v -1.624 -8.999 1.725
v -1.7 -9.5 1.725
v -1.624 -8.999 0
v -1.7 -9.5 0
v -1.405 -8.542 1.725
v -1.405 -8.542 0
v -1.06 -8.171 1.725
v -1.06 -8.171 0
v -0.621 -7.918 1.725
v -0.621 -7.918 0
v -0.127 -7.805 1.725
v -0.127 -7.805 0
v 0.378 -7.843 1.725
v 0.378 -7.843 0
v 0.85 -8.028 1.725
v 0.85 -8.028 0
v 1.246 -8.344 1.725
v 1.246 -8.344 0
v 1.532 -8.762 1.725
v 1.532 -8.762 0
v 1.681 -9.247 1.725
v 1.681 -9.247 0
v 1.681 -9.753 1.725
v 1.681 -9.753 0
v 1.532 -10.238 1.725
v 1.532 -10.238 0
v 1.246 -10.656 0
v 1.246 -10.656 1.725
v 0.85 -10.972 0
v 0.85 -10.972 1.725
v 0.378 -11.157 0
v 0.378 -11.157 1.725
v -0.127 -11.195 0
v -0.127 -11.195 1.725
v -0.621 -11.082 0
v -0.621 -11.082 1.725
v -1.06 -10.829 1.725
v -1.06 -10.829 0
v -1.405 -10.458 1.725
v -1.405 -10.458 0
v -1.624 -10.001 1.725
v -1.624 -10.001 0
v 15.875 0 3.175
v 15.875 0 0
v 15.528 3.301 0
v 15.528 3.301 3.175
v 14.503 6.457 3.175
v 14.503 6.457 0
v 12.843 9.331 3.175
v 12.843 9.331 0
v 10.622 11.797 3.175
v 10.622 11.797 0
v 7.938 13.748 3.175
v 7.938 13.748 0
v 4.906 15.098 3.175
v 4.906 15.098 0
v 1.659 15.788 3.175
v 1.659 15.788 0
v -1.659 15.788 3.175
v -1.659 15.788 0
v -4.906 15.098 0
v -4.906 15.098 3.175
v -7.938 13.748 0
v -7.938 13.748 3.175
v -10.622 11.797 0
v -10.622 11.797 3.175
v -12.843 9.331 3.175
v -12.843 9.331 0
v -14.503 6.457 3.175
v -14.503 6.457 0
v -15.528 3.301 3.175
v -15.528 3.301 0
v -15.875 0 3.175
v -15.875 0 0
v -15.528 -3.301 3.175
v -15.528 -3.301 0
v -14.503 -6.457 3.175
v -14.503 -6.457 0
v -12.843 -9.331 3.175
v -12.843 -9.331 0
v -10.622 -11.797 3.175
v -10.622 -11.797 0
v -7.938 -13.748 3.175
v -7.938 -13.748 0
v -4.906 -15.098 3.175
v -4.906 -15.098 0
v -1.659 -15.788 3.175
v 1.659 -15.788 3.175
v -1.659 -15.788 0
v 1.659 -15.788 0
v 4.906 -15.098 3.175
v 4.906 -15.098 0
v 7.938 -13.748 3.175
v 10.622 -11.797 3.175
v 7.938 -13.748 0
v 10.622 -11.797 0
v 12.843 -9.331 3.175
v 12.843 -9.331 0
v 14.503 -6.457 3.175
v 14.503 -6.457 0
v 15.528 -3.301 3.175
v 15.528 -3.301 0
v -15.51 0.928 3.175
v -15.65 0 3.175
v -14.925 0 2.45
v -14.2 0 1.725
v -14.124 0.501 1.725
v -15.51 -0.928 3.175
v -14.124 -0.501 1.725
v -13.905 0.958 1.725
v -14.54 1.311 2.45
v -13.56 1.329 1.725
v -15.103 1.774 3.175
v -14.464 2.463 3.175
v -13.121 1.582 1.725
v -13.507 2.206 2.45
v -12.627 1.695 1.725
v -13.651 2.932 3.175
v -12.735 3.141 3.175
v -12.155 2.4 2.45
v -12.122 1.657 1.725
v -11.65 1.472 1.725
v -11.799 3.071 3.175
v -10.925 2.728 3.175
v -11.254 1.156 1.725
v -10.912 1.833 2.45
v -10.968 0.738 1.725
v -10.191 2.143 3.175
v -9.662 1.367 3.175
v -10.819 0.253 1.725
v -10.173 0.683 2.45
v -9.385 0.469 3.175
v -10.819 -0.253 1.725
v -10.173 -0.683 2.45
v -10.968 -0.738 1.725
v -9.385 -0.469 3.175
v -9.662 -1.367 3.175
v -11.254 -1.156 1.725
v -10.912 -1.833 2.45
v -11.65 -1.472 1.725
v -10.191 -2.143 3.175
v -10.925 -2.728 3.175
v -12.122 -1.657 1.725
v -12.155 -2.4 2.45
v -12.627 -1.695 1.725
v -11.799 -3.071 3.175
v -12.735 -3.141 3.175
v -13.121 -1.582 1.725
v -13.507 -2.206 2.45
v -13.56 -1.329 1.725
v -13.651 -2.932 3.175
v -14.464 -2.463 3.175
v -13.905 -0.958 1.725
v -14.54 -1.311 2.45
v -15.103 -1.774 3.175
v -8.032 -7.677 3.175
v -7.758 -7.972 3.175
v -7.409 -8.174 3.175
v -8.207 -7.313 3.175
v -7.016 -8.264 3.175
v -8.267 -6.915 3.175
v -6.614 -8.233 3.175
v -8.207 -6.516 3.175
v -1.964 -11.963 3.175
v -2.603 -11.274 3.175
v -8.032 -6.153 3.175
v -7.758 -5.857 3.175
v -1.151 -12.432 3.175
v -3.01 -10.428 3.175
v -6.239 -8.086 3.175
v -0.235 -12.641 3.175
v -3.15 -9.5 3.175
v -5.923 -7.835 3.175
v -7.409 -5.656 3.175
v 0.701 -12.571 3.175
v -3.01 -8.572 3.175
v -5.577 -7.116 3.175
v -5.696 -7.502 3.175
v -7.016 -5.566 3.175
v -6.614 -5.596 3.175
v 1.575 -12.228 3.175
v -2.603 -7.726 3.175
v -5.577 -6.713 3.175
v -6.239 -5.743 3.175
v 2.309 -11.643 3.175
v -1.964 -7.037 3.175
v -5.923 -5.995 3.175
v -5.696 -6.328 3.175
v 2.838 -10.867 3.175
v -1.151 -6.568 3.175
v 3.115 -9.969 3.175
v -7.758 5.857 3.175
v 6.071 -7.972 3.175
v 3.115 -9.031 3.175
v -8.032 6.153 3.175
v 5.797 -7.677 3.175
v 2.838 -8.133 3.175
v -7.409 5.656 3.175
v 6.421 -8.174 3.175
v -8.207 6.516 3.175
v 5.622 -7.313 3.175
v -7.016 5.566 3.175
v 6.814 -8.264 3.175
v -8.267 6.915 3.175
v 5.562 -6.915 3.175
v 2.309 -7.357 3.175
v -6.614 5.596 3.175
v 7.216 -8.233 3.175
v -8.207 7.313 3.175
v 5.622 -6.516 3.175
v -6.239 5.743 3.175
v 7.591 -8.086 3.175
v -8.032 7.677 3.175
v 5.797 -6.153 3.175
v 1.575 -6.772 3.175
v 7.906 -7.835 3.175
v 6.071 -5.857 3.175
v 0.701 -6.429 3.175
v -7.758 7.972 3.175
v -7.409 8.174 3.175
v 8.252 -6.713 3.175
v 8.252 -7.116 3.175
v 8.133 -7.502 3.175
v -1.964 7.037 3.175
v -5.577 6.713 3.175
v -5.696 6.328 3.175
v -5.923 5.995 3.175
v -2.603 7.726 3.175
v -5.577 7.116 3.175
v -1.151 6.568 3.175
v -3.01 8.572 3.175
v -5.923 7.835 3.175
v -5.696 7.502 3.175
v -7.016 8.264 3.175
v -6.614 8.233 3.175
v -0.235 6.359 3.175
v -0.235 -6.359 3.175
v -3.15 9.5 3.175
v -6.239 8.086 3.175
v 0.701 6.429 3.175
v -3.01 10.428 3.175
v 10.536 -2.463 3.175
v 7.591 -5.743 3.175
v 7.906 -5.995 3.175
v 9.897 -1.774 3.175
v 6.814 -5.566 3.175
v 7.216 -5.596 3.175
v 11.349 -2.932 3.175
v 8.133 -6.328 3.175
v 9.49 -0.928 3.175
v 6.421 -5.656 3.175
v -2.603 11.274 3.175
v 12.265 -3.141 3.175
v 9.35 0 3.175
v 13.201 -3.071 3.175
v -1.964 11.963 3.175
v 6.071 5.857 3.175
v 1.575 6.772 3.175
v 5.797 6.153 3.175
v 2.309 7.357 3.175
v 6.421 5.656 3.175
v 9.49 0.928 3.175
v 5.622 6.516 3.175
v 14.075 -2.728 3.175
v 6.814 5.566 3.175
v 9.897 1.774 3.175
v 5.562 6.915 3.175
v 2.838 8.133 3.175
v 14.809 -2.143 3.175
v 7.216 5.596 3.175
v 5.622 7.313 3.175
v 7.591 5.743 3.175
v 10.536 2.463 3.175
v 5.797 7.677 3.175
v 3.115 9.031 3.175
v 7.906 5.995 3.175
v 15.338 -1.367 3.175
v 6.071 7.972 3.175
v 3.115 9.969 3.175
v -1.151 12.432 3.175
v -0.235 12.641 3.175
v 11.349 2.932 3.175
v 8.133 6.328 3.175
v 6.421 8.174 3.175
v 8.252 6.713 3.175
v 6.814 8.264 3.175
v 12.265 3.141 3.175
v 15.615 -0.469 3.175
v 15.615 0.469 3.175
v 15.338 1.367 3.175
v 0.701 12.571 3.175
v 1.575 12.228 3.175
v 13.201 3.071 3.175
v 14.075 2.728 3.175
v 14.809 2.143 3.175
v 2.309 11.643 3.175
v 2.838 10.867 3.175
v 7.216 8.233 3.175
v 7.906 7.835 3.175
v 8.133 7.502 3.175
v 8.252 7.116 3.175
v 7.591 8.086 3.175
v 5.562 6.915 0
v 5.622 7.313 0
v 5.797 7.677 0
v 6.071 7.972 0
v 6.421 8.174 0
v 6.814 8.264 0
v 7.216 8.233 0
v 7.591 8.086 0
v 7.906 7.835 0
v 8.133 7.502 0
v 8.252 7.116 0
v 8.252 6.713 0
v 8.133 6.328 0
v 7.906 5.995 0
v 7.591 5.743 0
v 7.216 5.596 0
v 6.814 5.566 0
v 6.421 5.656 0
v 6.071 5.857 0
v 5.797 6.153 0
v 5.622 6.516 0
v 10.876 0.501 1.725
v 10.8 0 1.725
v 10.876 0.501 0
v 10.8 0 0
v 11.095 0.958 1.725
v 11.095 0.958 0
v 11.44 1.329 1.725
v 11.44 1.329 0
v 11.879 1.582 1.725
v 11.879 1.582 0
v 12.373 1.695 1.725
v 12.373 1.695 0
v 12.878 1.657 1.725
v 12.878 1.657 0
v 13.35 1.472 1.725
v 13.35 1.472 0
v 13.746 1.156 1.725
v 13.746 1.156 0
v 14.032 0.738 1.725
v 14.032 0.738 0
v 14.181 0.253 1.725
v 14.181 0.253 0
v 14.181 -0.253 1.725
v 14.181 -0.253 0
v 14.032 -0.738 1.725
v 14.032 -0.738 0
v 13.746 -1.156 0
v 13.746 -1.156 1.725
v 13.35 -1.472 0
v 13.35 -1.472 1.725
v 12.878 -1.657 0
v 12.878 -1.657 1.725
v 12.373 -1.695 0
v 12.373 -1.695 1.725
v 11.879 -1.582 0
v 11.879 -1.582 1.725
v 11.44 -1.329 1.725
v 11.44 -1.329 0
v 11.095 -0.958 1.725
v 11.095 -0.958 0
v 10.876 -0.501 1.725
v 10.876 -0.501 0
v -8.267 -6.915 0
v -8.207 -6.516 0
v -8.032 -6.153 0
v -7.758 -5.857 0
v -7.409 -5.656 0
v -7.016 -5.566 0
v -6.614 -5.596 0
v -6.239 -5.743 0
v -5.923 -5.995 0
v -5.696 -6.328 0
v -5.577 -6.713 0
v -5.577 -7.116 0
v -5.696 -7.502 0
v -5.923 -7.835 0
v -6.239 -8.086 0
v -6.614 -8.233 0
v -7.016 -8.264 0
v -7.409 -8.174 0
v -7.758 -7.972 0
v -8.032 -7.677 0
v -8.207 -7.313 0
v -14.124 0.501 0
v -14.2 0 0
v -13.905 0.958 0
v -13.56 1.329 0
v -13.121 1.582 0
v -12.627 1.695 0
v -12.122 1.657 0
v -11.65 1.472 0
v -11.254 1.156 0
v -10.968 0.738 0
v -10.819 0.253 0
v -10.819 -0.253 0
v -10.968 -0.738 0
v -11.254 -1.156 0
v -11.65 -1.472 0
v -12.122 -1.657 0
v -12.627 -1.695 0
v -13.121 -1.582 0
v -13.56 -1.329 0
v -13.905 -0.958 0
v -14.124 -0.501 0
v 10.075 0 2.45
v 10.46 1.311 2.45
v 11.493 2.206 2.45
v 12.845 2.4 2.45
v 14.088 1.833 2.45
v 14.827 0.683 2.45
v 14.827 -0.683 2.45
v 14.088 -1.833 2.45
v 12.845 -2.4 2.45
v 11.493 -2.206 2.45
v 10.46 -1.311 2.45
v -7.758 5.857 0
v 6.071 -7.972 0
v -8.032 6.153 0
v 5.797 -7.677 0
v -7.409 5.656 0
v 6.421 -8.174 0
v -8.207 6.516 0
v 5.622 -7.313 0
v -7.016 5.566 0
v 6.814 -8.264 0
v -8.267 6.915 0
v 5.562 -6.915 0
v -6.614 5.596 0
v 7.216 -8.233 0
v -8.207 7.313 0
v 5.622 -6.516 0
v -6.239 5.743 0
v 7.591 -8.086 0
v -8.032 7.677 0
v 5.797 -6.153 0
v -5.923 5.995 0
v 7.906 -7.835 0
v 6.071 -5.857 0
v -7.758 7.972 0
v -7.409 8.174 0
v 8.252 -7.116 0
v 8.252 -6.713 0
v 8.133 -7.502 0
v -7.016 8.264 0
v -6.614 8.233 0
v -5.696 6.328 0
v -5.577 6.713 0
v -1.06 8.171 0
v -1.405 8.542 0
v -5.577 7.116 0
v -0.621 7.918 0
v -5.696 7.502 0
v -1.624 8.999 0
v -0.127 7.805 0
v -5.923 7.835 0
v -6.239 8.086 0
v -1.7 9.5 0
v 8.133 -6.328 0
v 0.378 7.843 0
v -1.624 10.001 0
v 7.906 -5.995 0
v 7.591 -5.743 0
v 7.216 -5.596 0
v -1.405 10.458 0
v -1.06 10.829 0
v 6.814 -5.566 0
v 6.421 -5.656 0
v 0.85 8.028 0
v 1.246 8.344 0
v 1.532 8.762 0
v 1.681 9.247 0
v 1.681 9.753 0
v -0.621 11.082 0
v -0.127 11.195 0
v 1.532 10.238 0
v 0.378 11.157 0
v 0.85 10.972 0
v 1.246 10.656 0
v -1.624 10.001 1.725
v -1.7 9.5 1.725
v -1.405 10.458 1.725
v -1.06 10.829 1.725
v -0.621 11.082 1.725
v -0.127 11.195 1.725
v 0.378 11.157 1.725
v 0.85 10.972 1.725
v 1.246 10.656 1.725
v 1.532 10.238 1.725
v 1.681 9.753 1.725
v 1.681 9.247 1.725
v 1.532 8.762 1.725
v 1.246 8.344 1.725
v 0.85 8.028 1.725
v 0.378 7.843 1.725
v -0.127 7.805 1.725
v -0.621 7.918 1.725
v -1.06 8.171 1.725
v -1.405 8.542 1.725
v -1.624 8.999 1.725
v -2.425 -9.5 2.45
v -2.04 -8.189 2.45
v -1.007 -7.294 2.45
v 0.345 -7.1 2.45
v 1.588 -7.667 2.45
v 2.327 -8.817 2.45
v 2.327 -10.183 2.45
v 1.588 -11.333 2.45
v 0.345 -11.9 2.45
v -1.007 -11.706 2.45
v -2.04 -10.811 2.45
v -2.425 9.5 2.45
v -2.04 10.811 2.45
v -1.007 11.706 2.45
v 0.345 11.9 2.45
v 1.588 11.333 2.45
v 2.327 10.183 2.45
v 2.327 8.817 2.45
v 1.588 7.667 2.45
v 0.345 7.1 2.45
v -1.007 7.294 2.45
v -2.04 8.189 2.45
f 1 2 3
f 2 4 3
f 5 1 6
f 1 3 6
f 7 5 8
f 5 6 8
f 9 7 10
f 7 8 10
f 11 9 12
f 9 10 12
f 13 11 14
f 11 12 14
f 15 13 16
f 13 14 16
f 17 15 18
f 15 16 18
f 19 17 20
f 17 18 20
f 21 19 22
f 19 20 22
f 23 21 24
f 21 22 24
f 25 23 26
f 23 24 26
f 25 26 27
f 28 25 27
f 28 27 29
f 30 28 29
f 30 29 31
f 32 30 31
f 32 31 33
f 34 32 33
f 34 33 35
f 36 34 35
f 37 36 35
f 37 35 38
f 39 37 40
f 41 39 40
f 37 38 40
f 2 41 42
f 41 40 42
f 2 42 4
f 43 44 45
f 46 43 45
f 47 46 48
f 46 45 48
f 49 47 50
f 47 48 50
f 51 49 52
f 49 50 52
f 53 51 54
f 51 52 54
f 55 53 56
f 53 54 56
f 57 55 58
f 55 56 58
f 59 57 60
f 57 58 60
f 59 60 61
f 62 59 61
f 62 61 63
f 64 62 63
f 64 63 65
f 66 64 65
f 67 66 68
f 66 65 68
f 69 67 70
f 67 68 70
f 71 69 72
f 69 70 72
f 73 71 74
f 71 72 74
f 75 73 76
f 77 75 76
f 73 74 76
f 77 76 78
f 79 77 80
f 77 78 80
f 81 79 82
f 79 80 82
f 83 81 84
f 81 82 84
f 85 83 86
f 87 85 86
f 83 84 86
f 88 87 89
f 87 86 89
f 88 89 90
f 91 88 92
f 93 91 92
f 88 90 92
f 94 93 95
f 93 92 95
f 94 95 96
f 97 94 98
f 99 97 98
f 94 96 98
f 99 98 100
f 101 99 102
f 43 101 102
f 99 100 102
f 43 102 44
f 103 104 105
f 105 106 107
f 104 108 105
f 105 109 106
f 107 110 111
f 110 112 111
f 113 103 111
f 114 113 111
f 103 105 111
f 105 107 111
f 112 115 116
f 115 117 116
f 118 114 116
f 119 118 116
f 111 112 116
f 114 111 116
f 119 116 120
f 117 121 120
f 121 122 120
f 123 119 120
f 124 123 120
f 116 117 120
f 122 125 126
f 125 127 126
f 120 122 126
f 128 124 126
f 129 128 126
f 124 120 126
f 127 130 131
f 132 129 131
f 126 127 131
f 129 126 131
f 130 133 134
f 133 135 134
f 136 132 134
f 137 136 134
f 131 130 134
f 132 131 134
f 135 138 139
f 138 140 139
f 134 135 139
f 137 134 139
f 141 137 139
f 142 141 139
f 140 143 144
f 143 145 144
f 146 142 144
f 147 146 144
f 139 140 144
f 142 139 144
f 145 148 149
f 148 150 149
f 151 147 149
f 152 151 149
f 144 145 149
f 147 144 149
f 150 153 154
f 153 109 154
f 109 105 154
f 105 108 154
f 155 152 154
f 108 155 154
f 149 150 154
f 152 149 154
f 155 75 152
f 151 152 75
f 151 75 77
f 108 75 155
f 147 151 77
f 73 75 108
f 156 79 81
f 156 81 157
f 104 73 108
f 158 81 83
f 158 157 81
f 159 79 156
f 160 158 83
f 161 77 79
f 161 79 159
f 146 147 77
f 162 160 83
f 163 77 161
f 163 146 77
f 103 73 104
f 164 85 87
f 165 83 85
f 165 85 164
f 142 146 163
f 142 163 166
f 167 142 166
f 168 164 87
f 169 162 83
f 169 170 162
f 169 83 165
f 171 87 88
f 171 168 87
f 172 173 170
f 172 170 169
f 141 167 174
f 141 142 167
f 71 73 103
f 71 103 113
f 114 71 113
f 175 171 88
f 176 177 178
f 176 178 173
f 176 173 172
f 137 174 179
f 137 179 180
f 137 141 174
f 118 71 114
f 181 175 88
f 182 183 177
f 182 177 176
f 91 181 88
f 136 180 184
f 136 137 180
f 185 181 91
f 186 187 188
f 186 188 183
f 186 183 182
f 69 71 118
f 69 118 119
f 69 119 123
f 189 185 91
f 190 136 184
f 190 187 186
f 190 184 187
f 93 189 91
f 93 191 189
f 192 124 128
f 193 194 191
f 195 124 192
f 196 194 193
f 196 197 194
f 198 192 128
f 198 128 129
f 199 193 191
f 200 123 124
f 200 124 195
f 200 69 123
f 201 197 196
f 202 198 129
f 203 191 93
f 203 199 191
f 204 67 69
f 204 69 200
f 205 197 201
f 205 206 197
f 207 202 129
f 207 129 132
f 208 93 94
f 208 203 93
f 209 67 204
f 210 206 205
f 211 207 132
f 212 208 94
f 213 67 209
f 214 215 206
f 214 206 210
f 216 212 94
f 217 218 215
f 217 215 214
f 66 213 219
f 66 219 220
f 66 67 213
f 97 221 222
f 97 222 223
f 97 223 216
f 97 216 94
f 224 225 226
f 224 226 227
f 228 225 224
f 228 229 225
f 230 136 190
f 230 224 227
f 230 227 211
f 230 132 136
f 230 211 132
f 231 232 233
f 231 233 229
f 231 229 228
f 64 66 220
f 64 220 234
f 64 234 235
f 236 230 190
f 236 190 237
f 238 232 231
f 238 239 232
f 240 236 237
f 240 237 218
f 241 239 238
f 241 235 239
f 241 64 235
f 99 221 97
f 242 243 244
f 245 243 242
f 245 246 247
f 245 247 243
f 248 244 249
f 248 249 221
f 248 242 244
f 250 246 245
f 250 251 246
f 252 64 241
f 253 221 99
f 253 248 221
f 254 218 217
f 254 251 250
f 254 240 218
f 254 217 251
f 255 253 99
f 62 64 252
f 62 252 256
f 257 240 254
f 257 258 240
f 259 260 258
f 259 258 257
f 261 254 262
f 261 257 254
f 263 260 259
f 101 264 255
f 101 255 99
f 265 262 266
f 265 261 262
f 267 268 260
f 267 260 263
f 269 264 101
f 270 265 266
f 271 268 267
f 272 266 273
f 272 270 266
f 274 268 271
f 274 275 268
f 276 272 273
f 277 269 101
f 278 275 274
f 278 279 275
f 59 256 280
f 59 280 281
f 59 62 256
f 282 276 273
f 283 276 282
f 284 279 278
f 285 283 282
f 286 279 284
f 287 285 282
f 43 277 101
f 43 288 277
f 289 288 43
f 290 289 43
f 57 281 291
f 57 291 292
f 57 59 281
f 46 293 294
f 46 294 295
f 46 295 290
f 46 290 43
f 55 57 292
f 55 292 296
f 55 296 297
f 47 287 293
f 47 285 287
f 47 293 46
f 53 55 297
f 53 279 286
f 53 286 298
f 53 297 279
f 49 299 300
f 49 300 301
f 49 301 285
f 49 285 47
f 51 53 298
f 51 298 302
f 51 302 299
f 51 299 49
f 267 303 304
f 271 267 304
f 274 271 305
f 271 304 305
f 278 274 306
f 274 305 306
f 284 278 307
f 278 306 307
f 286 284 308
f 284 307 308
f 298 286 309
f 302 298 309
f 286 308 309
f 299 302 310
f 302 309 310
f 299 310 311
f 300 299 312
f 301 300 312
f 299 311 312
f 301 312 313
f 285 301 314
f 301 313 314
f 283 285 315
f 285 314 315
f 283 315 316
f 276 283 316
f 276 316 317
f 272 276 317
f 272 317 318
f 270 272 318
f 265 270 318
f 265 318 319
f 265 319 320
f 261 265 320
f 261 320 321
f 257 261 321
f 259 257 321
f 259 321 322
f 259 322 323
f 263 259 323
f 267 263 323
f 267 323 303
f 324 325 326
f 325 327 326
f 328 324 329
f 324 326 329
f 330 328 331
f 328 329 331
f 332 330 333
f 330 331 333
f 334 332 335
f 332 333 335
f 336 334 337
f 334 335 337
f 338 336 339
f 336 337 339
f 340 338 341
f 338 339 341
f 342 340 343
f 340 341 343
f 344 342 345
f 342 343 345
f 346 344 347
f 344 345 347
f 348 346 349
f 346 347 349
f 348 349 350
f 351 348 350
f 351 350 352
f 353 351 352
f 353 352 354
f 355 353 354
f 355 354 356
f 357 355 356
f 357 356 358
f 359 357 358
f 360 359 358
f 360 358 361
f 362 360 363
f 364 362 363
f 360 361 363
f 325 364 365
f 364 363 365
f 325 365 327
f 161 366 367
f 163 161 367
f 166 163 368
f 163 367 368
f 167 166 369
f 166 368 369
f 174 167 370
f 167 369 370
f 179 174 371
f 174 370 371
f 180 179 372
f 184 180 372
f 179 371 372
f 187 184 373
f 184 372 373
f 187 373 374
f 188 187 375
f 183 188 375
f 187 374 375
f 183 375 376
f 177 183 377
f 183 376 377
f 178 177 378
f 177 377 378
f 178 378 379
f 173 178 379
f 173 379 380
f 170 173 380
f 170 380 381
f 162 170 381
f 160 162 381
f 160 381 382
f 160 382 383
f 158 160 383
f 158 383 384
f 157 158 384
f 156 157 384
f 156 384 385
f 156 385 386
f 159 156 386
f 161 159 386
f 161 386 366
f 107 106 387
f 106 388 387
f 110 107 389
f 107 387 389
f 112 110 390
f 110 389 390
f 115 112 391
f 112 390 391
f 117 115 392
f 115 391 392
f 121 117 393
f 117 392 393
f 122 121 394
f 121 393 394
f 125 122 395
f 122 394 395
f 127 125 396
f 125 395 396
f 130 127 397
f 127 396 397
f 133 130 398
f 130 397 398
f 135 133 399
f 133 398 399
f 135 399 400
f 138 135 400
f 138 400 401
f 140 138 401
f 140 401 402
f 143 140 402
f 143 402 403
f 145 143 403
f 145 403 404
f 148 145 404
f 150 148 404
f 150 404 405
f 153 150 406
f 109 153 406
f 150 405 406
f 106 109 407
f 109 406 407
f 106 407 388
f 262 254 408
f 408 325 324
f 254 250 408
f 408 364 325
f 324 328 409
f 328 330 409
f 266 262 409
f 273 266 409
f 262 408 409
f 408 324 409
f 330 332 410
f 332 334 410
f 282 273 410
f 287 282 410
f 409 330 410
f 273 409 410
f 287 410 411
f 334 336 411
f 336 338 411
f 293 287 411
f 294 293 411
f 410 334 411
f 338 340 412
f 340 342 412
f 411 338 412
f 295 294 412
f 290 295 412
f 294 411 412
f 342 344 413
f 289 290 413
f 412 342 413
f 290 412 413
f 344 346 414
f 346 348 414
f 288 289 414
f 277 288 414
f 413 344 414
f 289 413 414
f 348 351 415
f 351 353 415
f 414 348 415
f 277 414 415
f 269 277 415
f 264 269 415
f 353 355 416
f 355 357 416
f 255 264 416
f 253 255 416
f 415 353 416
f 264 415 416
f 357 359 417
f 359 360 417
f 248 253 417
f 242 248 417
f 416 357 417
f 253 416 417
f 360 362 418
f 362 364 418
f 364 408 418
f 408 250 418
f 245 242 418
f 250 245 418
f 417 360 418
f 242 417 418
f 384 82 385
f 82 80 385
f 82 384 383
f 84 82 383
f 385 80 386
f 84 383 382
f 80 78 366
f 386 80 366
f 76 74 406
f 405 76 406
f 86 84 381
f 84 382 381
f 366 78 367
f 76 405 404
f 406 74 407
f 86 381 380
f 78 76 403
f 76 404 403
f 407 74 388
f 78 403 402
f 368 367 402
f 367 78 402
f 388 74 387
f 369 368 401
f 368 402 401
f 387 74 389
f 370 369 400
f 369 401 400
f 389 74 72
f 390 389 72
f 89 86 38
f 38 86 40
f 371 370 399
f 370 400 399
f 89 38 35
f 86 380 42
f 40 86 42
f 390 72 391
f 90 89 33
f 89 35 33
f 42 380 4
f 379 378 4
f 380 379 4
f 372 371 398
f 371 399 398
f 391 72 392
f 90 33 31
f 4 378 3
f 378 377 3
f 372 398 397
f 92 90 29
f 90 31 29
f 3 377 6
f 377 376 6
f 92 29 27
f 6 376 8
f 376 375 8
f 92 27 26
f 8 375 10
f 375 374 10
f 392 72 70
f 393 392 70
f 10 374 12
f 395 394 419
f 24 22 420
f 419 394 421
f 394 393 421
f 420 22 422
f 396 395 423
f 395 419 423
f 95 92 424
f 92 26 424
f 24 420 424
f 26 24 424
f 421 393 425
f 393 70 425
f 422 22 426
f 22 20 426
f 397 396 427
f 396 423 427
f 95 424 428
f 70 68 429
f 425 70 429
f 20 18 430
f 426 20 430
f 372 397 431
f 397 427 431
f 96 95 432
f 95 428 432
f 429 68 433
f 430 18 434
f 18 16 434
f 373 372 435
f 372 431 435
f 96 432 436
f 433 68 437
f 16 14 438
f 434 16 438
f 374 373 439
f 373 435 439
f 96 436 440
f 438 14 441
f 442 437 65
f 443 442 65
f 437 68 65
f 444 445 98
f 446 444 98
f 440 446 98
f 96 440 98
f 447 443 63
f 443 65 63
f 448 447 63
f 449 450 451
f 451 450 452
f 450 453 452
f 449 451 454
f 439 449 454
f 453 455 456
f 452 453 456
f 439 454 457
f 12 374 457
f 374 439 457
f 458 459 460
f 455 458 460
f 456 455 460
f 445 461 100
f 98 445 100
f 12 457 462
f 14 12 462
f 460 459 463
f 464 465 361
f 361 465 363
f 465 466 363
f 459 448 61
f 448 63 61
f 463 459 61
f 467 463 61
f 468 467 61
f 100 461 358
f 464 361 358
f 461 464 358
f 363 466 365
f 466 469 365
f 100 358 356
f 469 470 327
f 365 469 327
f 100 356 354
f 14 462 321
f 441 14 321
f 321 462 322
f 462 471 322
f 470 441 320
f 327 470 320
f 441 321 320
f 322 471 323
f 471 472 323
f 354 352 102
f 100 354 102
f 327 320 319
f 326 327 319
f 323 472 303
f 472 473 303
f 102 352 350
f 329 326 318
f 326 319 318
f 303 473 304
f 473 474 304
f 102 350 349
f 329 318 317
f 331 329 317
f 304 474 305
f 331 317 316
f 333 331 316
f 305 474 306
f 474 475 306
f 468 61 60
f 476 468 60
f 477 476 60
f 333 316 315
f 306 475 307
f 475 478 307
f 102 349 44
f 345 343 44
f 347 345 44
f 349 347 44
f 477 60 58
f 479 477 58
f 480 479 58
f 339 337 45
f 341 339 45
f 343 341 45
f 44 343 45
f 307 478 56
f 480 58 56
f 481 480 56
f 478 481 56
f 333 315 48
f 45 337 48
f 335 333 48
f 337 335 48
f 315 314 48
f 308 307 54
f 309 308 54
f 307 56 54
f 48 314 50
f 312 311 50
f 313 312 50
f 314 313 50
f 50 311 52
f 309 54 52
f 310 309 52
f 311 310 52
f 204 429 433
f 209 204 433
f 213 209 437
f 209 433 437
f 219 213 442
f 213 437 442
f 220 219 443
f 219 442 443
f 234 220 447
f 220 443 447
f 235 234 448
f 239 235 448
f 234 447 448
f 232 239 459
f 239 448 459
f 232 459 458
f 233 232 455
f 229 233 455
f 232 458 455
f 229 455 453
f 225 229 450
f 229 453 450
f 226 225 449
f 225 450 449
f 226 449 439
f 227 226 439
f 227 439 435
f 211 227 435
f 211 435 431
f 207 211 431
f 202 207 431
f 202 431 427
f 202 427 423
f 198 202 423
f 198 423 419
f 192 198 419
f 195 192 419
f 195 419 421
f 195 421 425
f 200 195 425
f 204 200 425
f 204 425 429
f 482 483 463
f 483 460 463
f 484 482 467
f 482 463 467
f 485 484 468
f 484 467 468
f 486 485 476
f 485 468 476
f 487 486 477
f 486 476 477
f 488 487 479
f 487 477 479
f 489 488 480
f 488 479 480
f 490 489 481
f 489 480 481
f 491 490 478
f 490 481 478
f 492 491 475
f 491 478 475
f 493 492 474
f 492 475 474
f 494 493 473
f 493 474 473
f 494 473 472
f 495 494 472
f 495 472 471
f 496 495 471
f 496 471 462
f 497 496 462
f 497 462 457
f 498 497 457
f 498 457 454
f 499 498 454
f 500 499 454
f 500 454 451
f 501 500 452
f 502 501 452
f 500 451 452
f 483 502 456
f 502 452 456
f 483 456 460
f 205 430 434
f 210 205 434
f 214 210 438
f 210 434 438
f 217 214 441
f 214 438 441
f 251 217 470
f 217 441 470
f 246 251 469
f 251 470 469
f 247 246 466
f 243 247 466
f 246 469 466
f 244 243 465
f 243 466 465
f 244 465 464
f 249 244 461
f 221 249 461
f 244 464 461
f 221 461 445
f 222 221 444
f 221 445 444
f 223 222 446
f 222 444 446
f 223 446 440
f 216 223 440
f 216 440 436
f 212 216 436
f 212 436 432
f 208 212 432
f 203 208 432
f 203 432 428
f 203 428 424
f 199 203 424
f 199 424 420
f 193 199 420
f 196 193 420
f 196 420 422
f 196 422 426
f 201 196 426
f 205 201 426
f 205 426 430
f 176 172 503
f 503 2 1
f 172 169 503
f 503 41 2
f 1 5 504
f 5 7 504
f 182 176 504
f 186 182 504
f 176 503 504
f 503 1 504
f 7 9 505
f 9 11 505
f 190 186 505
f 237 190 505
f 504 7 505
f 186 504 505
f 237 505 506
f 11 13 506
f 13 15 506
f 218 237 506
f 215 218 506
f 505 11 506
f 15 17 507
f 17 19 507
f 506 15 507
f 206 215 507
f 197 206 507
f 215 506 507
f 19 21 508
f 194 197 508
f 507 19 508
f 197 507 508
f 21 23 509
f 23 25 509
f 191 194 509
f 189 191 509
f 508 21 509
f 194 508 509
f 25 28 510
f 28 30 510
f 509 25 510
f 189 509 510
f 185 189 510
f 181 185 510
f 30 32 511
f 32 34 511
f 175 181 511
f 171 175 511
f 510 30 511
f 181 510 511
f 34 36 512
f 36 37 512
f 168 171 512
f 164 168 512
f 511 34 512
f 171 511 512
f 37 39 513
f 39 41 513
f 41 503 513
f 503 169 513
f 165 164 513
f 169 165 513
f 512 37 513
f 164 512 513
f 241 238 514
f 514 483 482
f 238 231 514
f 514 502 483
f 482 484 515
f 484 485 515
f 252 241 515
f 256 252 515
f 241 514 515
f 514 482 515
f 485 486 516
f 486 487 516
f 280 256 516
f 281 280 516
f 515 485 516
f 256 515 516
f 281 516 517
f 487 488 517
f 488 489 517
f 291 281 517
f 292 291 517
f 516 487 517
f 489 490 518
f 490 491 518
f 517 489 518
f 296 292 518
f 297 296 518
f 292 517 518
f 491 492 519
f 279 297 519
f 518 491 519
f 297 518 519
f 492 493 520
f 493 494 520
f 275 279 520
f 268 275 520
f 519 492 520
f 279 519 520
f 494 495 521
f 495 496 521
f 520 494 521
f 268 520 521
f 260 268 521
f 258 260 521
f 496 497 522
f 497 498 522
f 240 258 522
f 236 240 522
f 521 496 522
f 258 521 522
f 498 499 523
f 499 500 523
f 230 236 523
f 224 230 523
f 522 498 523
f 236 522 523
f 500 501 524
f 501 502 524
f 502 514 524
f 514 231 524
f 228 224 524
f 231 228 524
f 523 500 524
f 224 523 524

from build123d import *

# Parameters (mm, degrees)
SKETCH1_R                                       = 15.875
BOSS_EXTRUDE1_DEPTH                             = 3.175
CSK_FOR_M3_FLAT_HEAD_MACHINE_SCREW1_D           = 3.4
CSK_FOR_M3_FLAT_HEAD_MACHINE_SCREW1_CSINK_D     = 6.3
CSK_FOR_M3_FLAT_HEAD_MACHINE_SCREW1_CSINK_ANGLE = 90
F_6_32_TAPPED_HOLE1_D                           = 2.7051


with BuildPart() as part:
    # Sketch1 → Boss-Extrude1 (new body)
    with BuildSketch(Plane.XY):
        Circle(SKETCH1_R)
    extrude(amount=BOSS_EXTRUDE1_DEPTH)

    # CSK for M3 Flat Head Machine Screw1 (through all)
    with Locations(Plane.XY.offset(3.175)):
        with Locations((0, 9.5), (0, -9.5), (12.5, 0), (-12.5, 0)):
            CounterSinkHole(CSK_FOR_M3_FLAT_HEAD_MACHINE_SCREW1_D / 2, CSK_FOR_M3_FLAT_HEAD_MACHINE_SCREW1_CSINK_D / 2, counter_sink_angle=CSK_FOR_M3_FLAT_HEAD_MACHINE_SCREW1_CSINK_ANGLE)

    # #6-32 Tapped Hole1 (through all)
    with Locations(Plane.XY.offset(3.175)):
        with Locations((-6.914797213, 6.914797213), (6.914797213, 6.914797213), (6.914797213, -6.914797213), (-6.914797213, -6.914797213)):
            Hole(F_6_32_TAPPED_HOLE1_D / 2)


solid = part.part
